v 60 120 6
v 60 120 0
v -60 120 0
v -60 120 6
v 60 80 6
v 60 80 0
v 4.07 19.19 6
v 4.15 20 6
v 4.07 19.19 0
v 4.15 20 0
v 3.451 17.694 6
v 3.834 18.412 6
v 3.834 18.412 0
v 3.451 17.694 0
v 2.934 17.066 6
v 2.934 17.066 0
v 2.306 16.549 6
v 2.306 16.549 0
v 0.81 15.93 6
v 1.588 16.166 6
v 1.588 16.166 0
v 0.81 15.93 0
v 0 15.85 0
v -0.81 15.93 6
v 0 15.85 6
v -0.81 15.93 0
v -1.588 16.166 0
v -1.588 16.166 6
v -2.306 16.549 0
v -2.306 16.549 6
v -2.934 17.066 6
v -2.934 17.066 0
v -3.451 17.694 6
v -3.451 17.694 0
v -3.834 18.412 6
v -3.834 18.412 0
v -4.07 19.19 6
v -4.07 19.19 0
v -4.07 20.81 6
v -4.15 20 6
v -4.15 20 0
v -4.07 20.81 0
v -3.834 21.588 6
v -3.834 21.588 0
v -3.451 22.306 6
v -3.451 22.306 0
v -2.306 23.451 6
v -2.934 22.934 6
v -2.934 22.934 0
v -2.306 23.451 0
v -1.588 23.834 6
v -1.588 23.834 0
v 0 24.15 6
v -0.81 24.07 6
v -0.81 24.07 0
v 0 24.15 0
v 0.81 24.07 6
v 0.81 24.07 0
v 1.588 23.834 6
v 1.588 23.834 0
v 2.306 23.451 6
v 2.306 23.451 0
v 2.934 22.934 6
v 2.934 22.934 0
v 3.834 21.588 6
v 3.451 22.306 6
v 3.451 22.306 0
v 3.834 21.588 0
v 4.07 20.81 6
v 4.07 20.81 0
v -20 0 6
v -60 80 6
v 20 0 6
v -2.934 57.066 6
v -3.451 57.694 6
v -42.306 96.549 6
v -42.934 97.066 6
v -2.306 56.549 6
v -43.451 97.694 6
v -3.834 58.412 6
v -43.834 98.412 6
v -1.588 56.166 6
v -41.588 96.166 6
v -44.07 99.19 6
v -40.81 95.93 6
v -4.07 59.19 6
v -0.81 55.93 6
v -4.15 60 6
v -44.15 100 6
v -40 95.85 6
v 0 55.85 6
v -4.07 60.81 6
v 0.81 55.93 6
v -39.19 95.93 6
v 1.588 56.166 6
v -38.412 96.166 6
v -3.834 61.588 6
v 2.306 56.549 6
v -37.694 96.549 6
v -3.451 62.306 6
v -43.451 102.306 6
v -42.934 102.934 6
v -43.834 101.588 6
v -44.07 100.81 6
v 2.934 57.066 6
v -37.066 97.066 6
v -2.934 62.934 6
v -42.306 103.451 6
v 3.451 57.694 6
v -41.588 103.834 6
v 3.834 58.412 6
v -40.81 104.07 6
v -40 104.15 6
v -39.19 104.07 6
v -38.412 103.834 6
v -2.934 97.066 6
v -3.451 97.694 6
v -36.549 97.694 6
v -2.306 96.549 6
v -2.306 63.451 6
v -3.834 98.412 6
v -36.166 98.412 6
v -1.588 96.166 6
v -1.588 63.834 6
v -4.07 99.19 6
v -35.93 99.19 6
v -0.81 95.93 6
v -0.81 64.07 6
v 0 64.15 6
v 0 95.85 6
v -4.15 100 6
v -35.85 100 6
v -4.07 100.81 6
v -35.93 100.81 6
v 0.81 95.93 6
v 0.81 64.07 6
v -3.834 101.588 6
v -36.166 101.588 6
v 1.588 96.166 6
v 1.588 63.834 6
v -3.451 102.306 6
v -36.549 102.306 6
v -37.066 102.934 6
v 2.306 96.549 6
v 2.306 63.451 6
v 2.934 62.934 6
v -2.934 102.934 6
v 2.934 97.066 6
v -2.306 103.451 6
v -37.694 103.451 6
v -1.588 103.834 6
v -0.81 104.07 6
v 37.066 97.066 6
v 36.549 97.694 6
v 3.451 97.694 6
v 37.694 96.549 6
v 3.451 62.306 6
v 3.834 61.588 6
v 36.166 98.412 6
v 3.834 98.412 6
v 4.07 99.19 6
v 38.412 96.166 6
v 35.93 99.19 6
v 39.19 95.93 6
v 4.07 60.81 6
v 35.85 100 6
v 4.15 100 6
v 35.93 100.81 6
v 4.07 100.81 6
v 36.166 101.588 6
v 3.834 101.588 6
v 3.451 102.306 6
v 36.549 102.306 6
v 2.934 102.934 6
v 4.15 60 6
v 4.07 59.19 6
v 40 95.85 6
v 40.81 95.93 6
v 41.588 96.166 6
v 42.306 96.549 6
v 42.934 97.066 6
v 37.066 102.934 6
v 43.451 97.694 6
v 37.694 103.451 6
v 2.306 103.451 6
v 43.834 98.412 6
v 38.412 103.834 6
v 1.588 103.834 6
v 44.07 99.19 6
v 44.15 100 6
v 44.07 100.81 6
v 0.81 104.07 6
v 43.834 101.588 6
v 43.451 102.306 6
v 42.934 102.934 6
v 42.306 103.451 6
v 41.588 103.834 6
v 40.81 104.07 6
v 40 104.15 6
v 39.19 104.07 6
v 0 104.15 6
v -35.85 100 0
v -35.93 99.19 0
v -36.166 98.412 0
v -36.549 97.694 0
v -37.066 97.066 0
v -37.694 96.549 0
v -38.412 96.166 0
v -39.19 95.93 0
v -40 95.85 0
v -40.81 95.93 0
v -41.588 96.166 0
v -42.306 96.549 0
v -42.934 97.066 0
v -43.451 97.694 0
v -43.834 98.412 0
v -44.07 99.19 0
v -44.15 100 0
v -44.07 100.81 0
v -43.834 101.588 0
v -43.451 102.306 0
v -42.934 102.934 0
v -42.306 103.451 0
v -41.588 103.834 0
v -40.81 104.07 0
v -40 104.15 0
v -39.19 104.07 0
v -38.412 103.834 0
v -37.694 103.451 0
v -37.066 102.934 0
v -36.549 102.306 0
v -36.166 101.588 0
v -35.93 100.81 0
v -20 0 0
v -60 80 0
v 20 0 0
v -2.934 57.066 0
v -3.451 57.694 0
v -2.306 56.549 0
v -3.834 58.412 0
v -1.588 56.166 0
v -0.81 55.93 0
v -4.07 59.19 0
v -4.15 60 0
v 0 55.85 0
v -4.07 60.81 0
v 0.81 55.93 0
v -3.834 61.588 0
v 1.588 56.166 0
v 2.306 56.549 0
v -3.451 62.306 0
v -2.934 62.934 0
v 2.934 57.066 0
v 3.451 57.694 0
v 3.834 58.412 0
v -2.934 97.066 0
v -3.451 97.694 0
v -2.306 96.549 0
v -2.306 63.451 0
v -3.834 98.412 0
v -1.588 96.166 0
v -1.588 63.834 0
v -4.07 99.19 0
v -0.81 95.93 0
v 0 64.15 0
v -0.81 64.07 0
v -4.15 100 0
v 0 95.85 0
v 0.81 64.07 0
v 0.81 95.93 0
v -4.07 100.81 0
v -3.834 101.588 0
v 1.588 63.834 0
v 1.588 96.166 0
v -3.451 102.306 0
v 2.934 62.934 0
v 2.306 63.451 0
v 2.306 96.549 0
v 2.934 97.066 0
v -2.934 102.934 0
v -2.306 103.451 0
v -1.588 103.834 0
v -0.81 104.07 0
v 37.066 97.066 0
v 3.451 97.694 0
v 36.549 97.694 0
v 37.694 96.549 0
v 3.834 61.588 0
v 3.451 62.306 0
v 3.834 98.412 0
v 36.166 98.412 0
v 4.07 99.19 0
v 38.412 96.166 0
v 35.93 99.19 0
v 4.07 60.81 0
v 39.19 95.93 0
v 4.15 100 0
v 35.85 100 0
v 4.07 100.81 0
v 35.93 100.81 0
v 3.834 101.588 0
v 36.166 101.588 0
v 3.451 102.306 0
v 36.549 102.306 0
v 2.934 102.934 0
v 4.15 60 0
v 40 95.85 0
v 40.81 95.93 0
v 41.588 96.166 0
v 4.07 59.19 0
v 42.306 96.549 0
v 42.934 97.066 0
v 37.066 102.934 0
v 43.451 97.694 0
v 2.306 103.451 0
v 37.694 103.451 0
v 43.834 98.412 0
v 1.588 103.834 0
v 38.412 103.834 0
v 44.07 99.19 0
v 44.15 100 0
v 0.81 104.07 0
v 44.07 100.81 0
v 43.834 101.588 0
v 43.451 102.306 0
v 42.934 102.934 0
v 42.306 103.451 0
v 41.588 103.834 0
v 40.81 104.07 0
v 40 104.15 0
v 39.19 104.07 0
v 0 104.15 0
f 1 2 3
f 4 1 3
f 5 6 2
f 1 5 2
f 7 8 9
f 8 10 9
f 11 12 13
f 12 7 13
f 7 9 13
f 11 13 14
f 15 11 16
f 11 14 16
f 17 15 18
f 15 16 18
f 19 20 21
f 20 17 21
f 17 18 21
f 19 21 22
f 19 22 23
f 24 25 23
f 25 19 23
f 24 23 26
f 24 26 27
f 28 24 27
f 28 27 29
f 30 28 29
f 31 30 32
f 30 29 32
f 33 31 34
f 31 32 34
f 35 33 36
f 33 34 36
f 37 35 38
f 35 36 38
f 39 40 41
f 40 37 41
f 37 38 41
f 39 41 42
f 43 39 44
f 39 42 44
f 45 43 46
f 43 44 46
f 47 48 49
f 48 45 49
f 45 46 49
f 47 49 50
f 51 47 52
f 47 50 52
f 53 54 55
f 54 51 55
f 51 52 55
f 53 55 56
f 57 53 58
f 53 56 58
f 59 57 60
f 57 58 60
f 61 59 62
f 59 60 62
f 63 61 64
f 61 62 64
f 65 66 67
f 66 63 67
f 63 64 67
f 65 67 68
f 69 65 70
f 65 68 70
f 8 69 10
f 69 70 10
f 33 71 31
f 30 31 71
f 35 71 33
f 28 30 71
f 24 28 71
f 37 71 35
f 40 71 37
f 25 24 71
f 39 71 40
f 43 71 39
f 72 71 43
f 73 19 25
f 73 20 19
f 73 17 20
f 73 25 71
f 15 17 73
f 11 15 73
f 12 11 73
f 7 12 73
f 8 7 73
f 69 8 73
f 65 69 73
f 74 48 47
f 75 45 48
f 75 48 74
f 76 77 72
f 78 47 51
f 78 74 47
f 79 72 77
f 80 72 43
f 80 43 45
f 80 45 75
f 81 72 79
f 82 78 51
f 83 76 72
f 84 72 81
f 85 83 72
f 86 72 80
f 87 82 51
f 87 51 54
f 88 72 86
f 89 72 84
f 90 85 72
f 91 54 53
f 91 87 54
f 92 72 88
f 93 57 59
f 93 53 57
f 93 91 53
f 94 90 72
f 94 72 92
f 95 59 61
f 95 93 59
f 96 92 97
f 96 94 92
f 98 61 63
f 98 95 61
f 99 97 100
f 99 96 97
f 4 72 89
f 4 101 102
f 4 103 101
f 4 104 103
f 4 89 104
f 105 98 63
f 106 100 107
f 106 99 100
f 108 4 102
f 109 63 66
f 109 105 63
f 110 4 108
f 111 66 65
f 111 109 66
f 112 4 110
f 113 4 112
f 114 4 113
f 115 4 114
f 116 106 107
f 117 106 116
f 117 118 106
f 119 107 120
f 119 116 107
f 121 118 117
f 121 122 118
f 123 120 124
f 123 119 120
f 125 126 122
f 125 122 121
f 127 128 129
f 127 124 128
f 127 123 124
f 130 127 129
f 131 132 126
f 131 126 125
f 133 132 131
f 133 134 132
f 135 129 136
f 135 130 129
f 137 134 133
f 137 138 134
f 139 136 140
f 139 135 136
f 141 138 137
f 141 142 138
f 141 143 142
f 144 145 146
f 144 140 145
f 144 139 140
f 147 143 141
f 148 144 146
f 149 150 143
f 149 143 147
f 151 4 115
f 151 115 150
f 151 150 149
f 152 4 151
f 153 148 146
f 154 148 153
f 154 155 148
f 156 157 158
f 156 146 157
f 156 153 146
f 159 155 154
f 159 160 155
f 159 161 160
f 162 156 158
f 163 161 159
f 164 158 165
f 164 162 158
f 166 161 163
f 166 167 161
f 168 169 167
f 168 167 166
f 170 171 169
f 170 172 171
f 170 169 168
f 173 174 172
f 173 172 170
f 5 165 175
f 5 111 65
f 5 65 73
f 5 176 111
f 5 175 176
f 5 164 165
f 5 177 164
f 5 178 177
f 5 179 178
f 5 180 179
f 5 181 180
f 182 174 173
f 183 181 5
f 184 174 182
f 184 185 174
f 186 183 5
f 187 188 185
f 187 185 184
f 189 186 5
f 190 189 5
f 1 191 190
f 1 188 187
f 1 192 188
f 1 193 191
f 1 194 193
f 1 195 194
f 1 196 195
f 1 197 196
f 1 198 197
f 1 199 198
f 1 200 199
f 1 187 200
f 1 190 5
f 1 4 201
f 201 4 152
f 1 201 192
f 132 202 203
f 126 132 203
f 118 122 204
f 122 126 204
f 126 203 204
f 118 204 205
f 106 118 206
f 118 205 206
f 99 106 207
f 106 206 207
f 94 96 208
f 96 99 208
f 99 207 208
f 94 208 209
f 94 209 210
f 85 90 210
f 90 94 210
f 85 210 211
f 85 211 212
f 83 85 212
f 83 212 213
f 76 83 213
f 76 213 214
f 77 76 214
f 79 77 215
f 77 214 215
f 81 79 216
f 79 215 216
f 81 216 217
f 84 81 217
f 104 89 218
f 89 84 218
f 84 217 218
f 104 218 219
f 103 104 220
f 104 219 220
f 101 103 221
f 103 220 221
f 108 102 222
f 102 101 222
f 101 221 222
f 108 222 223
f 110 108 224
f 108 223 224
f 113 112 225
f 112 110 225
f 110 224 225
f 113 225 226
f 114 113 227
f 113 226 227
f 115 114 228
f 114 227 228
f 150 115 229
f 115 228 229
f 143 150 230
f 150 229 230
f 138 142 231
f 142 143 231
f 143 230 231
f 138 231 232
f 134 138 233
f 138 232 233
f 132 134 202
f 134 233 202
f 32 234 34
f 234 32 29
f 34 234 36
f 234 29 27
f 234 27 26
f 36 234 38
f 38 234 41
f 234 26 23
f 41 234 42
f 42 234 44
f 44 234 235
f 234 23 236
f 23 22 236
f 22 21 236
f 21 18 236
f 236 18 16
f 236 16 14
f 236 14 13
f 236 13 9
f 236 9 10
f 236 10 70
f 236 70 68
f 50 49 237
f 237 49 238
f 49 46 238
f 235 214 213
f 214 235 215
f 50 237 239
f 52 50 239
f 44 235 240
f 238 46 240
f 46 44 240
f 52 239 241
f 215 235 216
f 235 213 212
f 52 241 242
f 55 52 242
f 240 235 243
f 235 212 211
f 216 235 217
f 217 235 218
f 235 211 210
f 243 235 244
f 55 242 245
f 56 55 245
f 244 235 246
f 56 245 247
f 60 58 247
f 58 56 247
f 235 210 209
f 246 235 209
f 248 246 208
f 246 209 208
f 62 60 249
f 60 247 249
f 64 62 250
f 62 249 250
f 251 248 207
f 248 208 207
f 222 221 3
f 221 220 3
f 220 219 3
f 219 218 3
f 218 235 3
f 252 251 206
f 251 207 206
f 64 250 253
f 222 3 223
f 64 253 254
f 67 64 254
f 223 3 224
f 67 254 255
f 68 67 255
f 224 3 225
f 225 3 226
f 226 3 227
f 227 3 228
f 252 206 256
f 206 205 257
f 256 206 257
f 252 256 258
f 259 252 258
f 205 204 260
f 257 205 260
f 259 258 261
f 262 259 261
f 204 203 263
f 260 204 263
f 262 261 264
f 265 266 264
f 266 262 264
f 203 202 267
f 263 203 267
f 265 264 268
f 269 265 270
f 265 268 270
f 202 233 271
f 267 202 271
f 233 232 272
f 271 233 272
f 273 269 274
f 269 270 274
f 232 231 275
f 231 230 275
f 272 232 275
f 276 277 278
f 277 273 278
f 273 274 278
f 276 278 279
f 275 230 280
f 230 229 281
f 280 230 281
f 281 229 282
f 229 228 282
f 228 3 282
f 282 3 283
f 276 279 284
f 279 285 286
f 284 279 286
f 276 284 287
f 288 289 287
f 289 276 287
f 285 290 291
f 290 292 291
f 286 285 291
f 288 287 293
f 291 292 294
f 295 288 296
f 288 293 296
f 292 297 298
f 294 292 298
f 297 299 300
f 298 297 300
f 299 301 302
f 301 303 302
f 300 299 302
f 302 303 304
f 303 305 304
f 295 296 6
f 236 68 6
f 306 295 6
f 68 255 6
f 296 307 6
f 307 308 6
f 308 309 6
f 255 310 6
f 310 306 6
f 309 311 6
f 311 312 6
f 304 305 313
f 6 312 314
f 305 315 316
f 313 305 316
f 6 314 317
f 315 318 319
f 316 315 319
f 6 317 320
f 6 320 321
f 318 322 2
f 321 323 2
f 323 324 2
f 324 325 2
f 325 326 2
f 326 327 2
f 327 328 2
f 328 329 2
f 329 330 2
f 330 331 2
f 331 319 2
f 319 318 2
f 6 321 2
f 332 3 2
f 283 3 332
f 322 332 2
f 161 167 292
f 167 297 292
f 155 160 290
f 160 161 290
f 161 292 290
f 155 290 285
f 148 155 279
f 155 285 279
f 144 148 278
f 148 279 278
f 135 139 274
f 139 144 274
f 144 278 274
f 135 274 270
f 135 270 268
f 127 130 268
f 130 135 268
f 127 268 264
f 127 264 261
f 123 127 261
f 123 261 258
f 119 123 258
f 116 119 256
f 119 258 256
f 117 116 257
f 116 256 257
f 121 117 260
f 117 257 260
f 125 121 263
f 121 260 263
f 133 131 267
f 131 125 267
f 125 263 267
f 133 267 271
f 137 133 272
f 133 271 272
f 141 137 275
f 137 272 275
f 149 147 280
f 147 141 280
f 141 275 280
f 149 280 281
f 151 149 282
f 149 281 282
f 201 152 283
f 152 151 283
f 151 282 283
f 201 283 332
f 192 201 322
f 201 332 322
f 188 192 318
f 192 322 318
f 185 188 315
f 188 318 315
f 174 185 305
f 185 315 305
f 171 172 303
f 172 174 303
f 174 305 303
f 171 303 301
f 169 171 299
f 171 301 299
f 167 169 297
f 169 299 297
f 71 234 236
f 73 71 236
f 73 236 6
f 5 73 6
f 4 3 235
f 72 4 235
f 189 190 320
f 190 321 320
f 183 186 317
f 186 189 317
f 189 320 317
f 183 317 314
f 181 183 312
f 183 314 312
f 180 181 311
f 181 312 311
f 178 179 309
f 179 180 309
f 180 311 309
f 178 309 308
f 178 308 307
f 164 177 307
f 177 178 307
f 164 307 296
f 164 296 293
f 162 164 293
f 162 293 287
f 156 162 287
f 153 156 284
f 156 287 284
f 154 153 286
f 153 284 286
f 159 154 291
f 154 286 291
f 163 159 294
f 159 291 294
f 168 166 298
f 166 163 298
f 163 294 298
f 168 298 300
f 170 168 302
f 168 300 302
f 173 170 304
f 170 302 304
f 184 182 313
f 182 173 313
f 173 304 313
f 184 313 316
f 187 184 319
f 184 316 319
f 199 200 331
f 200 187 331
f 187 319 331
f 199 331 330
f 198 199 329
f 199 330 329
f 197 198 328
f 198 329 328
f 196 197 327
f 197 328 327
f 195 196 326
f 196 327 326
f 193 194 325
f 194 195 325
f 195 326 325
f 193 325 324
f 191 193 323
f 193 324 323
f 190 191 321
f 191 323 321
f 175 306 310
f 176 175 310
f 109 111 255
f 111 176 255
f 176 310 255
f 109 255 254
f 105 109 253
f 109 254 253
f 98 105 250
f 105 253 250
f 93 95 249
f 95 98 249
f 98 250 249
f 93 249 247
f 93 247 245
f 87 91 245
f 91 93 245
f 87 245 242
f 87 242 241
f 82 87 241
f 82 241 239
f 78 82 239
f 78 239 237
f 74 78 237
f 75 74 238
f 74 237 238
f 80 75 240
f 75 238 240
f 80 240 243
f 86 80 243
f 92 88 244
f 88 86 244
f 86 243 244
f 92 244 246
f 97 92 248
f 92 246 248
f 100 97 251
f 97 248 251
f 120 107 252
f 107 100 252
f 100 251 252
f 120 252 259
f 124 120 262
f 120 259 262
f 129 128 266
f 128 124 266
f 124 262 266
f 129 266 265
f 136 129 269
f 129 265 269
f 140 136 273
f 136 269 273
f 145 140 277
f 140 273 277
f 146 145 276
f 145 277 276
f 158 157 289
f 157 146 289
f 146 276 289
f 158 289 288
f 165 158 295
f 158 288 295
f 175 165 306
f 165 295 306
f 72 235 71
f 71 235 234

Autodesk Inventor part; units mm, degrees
ref_plane "YZ Plane" through (0, 0, 0) normal (1, 0, 0) x (0, 1, 0)
ref_plane "XZ Plane" through (0, 0, 0) normal (0, 1, 0) x (-1, 0, 0)
ref_plane "XY Plane" through (0, 0, 0) normal (0, 0, 1) x (1, 0, 0)
sketch "Boceto1" plane through (0, 0, 0) normal (0, 0, 1) x (1, 0, 0)
  line L0 (-20, 0) -> (20, 0)
  line L1 (20, 0) -> (60, 80)
  line L2 (60, 80) -> (60, 120)
  line L3 (60, 120) -> (-60, 120)
  line L4 (-60, 120) -> (-60, 80)
  line L5 (-60, 80) -> (-20, 0)
  circle A0 centre (0, 100) radius 4.15
  circle A1 centre (0, 60) radius 4.15
  circle A2 centre (0, 20) radius 4.15
  circle A3 centre (40, 100) radius 4.15
  circle A4 centre (-40, 100) radius 4.15
  point P0 (0, 0)
  point P1 (0, 0)
  point P2 (0, 120)
  dimension "d0" = 120
  dimension "d1" = 120
  dimension "d2" = 40
  dimension "d3" = 40
  dimension "d4" = 20
  dimension "d5" = 8.3
  dimension "d6" = 40
  dimension "d7" = 40
  dimension "d8" = 40
  dimension "d9" = 40
extrude "Extrusión1" add sketch "Boceto1" along normal blind 6
equation "\"d8\" = d7"
equation "\"d9\" = d7"
properties part number "T"
